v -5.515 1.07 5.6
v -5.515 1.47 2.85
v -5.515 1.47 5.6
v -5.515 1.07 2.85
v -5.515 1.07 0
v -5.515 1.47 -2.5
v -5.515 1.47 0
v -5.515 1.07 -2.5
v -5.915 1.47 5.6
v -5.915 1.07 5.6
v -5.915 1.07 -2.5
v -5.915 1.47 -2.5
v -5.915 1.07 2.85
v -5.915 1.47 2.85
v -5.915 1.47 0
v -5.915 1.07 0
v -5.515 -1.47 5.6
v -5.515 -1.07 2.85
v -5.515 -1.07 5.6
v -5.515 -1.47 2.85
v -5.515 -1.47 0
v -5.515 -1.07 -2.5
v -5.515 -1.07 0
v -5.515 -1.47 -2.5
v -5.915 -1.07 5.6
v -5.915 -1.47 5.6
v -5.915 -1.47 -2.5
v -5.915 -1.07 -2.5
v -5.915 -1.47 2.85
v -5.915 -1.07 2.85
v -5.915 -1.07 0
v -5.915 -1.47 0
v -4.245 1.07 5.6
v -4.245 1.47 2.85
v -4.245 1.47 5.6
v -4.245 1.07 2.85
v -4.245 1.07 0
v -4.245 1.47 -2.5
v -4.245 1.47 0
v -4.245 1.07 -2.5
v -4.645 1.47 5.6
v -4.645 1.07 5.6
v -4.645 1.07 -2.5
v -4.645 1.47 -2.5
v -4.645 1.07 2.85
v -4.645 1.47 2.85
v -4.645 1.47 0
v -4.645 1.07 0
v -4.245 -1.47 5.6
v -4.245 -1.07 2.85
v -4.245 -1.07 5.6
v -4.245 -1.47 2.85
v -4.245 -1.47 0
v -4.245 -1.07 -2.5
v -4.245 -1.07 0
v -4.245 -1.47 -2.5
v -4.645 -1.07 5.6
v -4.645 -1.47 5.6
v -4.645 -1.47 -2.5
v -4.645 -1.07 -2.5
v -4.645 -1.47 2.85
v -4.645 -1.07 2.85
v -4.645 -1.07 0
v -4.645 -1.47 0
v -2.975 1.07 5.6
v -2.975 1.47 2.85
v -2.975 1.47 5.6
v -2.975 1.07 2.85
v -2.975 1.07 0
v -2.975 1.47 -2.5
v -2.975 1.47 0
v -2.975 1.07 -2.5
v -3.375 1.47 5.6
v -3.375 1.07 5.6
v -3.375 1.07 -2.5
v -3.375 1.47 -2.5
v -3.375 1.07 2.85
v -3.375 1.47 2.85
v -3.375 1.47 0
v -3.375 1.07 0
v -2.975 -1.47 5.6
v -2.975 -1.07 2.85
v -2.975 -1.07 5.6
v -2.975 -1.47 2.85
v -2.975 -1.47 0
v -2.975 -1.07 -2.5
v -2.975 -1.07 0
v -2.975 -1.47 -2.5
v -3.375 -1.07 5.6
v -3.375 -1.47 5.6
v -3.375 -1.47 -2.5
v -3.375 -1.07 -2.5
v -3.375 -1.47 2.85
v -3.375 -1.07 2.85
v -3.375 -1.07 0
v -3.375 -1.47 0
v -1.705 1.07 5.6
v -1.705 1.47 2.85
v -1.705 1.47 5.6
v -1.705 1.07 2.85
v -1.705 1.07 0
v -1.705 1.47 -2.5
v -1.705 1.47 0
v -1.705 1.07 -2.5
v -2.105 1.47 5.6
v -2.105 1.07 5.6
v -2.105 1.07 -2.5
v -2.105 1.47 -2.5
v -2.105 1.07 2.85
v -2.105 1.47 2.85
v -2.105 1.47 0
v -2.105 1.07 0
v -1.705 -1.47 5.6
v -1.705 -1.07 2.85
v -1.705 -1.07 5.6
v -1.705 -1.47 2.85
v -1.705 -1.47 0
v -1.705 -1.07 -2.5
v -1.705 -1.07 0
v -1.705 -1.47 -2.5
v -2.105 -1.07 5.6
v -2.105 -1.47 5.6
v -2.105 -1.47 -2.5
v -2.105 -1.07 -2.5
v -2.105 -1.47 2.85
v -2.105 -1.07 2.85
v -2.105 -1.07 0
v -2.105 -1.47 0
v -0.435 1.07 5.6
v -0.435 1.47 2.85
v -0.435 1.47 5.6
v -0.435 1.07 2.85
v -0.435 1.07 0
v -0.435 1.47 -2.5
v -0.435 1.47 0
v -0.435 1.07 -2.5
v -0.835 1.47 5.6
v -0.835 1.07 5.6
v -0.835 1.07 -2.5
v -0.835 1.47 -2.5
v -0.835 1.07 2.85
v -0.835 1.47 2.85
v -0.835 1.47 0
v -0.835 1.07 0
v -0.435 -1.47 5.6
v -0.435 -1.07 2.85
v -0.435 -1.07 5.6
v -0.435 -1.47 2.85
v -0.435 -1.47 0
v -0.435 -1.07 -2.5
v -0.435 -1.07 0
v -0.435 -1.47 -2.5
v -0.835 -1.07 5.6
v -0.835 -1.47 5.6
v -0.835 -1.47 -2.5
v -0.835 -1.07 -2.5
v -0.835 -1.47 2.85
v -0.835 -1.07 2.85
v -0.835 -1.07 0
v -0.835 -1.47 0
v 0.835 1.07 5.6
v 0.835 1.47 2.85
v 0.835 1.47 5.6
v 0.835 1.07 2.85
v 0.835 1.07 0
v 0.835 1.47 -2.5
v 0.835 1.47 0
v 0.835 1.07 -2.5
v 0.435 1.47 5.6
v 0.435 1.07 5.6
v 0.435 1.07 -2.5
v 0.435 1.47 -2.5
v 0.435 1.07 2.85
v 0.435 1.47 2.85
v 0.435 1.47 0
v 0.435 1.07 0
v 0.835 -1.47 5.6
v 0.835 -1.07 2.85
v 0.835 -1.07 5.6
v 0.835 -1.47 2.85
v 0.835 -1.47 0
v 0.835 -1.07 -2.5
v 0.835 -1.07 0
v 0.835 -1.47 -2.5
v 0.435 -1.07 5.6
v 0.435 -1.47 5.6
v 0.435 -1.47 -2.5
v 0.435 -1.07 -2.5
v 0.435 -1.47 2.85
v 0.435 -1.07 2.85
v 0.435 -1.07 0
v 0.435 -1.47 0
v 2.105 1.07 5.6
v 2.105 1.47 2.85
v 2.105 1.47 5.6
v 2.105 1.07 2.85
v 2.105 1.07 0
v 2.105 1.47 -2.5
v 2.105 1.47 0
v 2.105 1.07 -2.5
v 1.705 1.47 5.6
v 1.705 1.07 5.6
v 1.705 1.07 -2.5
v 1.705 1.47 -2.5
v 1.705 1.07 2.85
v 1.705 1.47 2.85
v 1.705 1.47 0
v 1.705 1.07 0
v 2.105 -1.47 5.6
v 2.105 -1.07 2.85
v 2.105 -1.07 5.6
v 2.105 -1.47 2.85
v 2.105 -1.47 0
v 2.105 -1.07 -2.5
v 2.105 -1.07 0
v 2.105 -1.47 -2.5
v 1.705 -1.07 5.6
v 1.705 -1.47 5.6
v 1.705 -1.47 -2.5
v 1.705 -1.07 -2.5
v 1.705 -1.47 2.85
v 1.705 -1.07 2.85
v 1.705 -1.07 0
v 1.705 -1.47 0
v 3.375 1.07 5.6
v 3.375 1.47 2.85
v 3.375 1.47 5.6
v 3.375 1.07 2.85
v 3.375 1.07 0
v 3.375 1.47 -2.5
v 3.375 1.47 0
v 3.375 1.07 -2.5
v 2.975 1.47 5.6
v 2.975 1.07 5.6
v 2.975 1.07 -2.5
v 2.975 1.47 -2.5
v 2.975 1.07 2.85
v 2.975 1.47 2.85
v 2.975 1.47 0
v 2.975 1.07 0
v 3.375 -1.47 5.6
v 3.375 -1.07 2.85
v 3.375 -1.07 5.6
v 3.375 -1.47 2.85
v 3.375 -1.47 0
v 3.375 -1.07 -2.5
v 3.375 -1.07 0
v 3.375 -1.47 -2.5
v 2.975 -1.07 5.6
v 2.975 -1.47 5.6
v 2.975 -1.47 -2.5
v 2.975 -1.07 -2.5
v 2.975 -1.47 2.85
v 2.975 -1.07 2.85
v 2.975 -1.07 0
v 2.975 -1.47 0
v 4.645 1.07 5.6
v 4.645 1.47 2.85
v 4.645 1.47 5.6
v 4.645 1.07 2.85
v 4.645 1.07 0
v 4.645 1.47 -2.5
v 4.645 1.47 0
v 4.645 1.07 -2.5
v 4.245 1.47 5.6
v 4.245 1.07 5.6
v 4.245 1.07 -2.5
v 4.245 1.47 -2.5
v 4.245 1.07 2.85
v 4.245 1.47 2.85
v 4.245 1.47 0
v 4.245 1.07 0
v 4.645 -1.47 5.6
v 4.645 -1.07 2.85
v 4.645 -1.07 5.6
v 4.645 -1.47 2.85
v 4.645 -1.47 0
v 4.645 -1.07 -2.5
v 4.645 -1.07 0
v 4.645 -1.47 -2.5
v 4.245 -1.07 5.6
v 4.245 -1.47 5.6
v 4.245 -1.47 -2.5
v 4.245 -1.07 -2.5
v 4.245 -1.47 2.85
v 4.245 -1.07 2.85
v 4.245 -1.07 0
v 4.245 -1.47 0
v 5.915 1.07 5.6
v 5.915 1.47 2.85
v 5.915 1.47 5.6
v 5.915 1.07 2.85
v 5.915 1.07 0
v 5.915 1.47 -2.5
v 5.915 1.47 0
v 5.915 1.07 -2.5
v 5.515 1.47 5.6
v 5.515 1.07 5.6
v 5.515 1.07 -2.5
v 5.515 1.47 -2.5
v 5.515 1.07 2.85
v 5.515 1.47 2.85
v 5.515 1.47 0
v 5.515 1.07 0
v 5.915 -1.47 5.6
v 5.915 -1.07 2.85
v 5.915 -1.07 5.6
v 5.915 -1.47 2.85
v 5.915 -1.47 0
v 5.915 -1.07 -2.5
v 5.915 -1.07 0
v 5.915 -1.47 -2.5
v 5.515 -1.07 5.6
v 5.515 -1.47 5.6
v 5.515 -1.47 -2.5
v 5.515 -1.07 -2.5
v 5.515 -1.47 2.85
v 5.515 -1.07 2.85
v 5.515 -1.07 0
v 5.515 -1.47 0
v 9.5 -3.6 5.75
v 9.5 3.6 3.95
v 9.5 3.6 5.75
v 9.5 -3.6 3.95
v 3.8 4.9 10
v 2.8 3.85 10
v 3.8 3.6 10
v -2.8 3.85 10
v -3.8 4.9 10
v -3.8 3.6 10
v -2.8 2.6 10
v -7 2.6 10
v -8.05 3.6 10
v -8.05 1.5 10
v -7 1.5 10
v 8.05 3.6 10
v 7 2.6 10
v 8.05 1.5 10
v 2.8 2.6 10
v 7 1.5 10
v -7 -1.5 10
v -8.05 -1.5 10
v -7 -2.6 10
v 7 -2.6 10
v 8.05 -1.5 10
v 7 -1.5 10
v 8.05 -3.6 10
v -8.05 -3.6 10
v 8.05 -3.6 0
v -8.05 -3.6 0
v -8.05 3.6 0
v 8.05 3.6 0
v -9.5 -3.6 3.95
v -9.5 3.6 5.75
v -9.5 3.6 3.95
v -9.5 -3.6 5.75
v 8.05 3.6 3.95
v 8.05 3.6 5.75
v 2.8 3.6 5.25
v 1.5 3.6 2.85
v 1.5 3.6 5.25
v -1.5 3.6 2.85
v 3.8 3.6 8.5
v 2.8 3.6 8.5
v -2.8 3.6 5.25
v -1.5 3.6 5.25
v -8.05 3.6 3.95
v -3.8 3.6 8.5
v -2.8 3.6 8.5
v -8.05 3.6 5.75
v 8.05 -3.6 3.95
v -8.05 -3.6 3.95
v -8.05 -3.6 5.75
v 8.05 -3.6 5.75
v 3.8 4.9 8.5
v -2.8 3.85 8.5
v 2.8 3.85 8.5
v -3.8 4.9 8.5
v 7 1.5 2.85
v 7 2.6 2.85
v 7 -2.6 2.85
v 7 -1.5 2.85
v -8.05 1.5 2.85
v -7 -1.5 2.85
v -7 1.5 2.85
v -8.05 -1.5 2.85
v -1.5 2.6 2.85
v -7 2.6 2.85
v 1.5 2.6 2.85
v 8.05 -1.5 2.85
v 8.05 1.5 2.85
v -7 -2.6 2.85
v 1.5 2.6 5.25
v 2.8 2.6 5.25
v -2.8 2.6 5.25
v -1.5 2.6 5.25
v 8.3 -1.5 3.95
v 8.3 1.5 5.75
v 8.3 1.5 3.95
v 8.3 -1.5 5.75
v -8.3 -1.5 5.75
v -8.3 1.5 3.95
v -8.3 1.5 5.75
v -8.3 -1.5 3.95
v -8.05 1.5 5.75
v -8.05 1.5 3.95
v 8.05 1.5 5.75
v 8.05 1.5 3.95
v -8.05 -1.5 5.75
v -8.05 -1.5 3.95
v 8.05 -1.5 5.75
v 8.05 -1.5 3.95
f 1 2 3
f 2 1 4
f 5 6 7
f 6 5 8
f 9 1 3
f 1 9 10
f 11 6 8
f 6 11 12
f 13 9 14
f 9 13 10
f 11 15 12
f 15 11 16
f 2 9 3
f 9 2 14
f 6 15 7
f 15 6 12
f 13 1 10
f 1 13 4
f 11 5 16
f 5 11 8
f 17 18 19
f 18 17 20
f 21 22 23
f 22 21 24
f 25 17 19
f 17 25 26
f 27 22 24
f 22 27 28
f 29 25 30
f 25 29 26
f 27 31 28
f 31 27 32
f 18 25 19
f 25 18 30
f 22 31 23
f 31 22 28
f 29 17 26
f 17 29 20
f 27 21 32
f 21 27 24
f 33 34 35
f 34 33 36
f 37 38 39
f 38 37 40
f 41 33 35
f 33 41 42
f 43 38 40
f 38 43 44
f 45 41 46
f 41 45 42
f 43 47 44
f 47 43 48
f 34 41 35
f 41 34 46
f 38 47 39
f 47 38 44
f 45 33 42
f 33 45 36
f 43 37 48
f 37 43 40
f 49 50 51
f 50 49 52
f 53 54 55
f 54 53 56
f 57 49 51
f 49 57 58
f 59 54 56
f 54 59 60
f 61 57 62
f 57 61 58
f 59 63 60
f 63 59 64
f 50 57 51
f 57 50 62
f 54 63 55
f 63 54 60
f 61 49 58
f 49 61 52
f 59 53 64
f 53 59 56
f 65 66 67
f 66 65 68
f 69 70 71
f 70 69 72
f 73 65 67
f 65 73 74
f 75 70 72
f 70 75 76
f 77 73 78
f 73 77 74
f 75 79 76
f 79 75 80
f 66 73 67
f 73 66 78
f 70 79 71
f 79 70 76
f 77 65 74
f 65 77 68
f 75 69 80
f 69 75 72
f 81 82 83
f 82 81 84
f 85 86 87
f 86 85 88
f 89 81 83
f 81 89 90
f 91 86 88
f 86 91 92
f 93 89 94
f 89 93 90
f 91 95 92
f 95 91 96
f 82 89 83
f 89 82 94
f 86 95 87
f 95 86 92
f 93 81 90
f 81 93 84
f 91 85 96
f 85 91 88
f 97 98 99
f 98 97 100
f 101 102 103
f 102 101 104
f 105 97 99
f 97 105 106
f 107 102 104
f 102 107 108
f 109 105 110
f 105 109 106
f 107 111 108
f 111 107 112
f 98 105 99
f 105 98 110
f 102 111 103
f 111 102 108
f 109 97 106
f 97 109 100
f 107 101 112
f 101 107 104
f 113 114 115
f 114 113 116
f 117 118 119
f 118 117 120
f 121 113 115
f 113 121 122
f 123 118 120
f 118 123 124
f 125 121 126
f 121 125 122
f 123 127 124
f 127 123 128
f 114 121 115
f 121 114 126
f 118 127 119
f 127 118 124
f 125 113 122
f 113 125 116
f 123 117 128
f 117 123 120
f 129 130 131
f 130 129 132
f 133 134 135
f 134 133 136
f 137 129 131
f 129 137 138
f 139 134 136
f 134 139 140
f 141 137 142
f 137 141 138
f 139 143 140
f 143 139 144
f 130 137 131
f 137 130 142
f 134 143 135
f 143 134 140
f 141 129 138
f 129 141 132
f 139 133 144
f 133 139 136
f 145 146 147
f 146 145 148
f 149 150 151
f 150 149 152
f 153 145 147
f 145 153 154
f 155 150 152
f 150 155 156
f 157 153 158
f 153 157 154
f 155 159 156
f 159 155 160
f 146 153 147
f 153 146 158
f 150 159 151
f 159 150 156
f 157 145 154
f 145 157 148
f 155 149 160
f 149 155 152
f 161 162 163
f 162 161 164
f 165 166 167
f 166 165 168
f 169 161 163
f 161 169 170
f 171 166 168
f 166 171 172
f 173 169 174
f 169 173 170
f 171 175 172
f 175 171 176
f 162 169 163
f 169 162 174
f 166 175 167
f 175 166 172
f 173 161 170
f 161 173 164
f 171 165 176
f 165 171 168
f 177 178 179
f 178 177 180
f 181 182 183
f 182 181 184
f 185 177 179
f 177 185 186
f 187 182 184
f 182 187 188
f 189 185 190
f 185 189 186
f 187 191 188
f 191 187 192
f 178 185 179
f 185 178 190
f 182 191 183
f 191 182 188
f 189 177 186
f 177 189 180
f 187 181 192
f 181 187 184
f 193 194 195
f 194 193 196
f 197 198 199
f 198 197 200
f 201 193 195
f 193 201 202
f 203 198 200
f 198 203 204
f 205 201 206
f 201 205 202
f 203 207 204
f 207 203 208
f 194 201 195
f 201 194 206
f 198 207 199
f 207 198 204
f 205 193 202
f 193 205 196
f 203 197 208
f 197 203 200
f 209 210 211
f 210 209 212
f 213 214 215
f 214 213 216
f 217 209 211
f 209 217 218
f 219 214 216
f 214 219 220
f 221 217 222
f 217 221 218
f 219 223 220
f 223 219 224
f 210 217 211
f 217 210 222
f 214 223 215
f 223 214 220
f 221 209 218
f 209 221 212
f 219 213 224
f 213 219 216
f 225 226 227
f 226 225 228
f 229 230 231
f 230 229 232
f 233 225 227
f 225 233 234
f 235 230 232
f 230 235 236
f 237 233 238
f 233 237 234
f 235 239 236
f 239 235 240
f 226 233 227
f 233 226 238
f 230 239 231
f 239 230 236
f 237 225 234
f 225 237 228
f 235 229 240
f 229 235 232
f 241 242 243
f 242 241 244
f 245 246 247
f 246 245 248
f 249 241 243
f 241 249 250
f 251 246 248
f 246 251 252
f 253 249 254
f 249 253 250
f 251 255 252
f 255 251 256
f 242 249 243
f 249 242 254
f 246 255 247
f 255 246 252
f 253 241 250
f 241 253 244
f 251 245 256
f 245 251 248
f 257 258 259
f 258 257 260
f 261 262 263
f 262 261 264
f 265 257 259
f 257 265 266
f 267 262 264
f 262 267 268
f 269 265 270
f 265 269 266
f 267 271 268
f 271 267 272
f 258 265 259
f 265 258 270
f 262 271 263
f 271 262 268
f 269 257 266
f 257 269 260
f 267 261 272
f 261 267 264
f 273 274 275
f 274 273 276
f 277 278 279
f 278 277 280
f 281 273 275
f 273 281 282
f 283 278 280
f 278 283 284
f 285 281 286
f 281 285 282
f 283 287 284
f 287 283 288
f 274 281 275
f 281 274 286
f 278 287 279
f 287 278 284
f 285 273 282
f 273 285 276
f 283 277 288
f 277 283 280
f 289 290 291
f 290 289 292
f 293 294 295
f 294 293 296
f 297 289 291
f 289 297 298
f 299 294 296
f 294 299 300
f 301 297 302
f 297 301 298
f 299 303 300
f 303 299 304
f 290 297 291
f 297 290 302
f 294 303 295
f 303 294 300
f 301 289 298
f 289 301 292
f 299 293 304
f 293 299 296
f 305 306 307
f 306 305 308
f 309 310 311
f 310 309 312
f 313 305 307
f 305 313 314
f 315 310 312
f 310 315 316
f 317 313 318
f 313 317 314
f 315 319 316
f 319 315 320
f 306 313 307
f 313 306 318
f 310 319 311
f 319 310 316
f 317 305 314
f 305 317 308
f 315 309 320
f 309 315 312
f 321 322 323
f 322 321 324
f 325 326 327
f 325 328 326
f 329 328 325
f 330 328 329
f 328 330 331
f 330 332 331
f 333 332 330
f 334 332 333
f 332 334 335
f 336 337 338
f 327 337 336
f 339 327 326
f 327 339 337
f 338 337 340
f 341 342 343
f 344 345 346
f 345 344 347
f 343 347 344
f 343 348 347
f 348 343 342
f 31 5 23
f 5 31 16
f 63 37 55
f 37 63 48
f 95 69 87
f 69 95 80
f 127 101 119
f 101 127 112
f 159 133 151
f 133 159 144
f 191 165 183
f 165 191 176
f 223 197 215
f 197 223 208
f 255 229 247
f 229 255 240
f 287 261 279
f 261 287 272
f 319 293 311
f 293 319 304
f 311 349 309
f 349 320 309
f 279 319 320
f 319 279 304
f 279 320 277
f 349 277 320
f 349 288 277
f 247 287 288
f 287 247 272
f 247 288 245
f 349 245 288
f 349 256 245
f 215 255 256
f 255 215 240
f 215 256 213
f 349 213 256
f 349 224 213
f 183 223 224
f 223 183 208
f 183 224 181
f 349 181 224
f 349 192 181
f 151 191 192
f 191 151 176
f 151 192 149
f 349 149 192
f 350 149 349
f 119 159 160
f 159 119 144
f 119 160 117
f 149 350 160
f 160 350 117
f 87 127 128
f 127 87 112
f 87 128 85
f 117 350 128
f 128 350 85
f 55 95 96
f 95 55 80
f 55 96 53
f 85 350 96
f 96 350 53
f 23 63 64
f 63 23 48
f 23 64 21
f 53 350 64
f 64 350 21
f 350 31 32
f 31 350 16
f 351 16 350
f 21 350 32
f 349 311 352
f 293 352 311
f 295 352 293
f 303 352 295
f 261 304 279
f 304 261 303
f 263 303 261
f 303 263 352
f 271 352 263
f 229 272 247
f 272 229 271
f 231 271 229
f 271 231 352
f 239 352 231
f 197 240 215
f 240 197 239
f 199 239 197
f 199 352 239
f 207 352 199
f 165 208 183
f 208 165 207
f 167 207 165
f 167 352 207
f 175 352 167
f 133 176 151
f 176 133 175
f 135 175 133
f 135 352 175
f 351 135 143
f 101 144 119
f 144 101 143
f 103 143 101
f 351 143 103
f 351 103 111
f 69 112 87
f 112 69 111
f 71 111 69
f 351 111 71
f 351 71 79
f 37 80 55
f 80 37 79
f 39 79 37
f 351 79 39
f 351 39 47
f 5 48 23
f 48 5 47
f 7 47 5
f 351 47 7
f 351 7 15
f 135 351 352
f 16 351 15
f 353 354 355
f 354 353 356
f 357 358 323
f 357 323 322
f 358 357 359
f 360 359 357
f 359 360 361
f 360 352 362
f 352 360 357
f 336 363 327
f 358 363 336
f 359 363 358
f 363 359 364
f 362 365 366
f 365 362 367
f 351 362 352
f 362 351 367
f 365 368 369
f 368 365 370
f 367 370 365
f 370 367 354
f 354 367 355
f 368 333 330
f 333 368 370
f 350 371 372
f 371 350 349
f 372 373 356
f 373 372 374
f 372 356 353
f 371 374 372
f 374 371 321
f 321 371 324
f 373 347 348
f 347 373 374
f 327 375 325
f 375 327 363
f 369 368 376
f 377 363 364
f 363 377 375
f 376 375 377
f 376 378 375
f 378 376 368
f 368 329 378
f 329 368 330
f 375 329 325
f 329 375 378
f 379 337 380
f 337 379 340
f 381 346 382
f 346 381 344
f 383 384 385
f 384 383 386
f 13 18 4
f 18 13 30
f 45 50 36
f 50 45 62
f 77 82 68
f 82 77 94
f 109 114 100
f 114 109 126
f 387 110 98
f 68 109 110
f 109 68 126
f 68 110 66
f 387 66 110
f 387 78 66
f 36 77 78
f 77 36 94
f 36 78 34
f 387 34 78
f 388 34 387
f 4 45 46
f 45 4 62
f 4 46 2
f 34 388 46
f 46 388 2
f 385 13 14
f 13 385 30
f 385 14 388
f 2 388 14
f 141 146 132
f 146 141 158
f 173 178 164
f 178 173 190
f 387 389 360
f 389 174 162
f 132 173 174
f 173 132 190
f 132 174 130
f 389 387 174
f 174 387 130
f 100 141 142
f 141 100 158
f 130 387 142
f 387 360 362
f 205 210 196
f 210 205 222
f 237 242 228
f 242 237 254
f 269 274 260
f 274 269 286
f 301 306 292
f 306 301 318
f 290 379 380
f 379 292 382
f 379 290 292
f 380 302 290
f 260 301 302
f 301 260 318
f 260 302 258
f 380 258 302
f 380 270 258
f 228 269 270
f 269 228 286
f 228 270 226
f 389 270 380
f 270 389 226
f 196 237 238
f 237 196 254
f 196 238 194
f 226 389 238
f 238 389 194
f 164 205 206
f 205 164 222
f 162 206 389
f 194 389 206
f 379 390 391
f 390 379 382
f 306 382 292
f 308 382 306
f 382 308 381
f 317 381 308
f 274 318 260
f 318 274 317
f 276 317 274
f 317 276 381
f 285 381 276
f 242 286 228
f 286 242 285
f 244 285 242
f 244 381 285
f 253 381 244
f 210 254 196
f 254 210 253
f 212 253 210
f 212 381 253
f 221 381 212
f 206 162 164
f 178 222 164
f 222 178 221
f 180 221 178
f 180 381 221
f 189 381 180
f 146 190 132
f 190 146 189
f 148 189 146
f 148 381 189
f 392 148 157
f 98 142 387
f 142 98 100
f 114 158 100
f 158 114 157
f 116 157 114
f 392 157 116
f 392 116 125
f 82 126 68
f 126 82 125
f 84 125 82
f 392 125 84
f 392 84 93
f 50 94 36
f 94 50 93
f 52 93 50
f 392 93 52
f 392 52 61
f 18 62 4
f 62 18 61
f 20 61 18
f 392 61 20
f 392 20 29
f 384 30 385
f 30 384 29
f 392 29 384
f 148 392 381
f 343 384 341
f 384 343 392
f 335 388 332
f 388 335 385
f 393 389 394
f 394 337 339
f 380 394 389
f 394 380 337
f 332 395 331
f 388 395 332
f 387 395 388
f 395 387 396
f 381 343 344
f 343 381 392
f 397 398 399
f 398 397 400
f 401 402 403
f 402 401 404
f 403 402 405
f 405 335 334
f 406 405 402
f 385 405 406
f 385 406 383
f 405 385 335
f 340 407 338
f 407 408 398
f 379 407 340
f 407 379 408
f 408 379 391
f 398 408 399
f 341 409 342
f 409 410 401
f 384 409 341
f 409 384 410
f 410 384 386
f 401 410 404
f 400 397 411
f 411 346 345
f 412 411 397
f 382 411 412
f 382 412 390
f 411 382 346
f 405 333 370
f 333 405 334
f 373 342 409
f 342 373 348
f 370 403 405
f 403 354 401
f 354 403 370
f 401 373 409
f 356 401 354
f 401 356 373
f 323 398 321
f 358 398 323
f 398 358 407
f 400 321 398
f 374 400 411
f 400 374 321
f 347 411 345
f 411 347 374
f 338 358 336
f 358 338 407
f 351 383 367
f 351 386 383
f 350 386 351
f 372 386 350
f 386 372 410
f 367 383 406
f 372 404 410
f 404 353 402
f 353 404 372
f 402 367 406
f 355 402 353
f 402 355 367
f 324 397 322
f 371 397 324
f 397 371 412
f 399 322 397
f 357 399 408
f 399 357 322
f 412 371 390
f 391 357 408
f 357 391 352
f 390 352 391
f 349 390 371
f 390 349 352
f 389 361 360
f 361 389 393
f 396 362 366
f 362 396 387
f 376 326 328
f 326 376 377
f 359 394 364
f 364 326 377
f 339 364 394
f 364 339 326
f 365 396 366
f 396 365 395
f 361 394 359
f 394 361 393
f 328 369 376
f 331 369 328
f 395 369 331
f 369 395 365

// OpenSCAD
pin_pitch_x = 1.27;
pin_pitch_y = 2.54;
pin_width = 0.4;
pin_height = 8.1-2.5;
pin_depth = 2.5;

shroud_width = 7.2;
shroud_length = 19;
shroud_height = 10;

inset_length = 16;
inset_height = 4.3;
inset_height2 = 4;

internal_width = 5.2;
internal_length = 14;
internal_height = 7.2;

clip_length = 16.6;
clip_width = 3;

index_offset = 6.5 - internal_width;
index_offset3 = 8.5 - shroud_width;
index_width1 = 3;
index_width2 = 5.6;
index_height2 = 4.8;
index_height3 = 1.5;

color("#fd1") translate([-pin_pitch_x * 4.5, 0, 0]) for (x = [0 : 9]) {
    translate([x * pin_pitch_x, 0, 0]) {
        translate([0, pin_pitch_y/2, (pin_height - pin_depth) / 2]) cube([pin_width, pin_width, pin_height + pin_depth], center = true);
        translate([0, -pin_pitch_y/2, (pin_height - pin_depth) / 2]) cube([pin_width, pin_width, pin_height + pin_depth], center = true);
    }
}

color("#222") difference() {
    union() {
        translate([0, 0, shroud_height/2]) cube([shroud_length, shroud_width, shroud_height], center = true);
        translate([0, shroud_width/2 + index_offset3/2, shroud_height - index_height3/2]) cube([index_width2 + 2, index_offset3, index_height3], center = true);
    }
    
    translate([0, 0, shroud_height - internal_height/2 + 0.05]) cube([internal_length, internal_width, internal_height], center = true);
    translate([0, 0, shroud_height - internal_height/2 + 0.05]) cube([clip_length, clip_width, internal_height], center = true);
    
    inset_w = (shroud_length - inset_length)/2;
    inset_x = shroud_length/2 - inset_w/2;
    inset_y = shroud_height - inset_height/2;
    translate([-inset_x - 0.05, 0, inset_y + 0.05]) cube([inset_w, shroud_width + 1, inset_height], center = true);
    translate([inset_x + 0.05, 0, inset_y + 0.05]) cube([inset_w, shroud_width + 1, inset_height], center = true);
    
    inset_y2 = inset_height2/2;
    translate([-inset_x - 0.05, 0, inset_y2 - 0.05]) cube([inset_w, shroud_width + 1, inset_height2], center = true);
    translate([inset_x + 0.05, 0, inset_y2 - 0.05]) cube([inset_w, shroud_width + 1, inset_height2], center = true);
    
    
    translate([0, internal_width/2 + index_offset/2 - 0.05, shroud_height - internal_height/2 + 0.05]) cube([index_width1, index_offset, internal_height], center = true);
    translate([0, internal_width/2 + index_offset/2 - 0.05, shroud_height - index_height2/2 + 0.05]) cube([index_width2, index_offset, index_height2], center = true);
    
    
}
